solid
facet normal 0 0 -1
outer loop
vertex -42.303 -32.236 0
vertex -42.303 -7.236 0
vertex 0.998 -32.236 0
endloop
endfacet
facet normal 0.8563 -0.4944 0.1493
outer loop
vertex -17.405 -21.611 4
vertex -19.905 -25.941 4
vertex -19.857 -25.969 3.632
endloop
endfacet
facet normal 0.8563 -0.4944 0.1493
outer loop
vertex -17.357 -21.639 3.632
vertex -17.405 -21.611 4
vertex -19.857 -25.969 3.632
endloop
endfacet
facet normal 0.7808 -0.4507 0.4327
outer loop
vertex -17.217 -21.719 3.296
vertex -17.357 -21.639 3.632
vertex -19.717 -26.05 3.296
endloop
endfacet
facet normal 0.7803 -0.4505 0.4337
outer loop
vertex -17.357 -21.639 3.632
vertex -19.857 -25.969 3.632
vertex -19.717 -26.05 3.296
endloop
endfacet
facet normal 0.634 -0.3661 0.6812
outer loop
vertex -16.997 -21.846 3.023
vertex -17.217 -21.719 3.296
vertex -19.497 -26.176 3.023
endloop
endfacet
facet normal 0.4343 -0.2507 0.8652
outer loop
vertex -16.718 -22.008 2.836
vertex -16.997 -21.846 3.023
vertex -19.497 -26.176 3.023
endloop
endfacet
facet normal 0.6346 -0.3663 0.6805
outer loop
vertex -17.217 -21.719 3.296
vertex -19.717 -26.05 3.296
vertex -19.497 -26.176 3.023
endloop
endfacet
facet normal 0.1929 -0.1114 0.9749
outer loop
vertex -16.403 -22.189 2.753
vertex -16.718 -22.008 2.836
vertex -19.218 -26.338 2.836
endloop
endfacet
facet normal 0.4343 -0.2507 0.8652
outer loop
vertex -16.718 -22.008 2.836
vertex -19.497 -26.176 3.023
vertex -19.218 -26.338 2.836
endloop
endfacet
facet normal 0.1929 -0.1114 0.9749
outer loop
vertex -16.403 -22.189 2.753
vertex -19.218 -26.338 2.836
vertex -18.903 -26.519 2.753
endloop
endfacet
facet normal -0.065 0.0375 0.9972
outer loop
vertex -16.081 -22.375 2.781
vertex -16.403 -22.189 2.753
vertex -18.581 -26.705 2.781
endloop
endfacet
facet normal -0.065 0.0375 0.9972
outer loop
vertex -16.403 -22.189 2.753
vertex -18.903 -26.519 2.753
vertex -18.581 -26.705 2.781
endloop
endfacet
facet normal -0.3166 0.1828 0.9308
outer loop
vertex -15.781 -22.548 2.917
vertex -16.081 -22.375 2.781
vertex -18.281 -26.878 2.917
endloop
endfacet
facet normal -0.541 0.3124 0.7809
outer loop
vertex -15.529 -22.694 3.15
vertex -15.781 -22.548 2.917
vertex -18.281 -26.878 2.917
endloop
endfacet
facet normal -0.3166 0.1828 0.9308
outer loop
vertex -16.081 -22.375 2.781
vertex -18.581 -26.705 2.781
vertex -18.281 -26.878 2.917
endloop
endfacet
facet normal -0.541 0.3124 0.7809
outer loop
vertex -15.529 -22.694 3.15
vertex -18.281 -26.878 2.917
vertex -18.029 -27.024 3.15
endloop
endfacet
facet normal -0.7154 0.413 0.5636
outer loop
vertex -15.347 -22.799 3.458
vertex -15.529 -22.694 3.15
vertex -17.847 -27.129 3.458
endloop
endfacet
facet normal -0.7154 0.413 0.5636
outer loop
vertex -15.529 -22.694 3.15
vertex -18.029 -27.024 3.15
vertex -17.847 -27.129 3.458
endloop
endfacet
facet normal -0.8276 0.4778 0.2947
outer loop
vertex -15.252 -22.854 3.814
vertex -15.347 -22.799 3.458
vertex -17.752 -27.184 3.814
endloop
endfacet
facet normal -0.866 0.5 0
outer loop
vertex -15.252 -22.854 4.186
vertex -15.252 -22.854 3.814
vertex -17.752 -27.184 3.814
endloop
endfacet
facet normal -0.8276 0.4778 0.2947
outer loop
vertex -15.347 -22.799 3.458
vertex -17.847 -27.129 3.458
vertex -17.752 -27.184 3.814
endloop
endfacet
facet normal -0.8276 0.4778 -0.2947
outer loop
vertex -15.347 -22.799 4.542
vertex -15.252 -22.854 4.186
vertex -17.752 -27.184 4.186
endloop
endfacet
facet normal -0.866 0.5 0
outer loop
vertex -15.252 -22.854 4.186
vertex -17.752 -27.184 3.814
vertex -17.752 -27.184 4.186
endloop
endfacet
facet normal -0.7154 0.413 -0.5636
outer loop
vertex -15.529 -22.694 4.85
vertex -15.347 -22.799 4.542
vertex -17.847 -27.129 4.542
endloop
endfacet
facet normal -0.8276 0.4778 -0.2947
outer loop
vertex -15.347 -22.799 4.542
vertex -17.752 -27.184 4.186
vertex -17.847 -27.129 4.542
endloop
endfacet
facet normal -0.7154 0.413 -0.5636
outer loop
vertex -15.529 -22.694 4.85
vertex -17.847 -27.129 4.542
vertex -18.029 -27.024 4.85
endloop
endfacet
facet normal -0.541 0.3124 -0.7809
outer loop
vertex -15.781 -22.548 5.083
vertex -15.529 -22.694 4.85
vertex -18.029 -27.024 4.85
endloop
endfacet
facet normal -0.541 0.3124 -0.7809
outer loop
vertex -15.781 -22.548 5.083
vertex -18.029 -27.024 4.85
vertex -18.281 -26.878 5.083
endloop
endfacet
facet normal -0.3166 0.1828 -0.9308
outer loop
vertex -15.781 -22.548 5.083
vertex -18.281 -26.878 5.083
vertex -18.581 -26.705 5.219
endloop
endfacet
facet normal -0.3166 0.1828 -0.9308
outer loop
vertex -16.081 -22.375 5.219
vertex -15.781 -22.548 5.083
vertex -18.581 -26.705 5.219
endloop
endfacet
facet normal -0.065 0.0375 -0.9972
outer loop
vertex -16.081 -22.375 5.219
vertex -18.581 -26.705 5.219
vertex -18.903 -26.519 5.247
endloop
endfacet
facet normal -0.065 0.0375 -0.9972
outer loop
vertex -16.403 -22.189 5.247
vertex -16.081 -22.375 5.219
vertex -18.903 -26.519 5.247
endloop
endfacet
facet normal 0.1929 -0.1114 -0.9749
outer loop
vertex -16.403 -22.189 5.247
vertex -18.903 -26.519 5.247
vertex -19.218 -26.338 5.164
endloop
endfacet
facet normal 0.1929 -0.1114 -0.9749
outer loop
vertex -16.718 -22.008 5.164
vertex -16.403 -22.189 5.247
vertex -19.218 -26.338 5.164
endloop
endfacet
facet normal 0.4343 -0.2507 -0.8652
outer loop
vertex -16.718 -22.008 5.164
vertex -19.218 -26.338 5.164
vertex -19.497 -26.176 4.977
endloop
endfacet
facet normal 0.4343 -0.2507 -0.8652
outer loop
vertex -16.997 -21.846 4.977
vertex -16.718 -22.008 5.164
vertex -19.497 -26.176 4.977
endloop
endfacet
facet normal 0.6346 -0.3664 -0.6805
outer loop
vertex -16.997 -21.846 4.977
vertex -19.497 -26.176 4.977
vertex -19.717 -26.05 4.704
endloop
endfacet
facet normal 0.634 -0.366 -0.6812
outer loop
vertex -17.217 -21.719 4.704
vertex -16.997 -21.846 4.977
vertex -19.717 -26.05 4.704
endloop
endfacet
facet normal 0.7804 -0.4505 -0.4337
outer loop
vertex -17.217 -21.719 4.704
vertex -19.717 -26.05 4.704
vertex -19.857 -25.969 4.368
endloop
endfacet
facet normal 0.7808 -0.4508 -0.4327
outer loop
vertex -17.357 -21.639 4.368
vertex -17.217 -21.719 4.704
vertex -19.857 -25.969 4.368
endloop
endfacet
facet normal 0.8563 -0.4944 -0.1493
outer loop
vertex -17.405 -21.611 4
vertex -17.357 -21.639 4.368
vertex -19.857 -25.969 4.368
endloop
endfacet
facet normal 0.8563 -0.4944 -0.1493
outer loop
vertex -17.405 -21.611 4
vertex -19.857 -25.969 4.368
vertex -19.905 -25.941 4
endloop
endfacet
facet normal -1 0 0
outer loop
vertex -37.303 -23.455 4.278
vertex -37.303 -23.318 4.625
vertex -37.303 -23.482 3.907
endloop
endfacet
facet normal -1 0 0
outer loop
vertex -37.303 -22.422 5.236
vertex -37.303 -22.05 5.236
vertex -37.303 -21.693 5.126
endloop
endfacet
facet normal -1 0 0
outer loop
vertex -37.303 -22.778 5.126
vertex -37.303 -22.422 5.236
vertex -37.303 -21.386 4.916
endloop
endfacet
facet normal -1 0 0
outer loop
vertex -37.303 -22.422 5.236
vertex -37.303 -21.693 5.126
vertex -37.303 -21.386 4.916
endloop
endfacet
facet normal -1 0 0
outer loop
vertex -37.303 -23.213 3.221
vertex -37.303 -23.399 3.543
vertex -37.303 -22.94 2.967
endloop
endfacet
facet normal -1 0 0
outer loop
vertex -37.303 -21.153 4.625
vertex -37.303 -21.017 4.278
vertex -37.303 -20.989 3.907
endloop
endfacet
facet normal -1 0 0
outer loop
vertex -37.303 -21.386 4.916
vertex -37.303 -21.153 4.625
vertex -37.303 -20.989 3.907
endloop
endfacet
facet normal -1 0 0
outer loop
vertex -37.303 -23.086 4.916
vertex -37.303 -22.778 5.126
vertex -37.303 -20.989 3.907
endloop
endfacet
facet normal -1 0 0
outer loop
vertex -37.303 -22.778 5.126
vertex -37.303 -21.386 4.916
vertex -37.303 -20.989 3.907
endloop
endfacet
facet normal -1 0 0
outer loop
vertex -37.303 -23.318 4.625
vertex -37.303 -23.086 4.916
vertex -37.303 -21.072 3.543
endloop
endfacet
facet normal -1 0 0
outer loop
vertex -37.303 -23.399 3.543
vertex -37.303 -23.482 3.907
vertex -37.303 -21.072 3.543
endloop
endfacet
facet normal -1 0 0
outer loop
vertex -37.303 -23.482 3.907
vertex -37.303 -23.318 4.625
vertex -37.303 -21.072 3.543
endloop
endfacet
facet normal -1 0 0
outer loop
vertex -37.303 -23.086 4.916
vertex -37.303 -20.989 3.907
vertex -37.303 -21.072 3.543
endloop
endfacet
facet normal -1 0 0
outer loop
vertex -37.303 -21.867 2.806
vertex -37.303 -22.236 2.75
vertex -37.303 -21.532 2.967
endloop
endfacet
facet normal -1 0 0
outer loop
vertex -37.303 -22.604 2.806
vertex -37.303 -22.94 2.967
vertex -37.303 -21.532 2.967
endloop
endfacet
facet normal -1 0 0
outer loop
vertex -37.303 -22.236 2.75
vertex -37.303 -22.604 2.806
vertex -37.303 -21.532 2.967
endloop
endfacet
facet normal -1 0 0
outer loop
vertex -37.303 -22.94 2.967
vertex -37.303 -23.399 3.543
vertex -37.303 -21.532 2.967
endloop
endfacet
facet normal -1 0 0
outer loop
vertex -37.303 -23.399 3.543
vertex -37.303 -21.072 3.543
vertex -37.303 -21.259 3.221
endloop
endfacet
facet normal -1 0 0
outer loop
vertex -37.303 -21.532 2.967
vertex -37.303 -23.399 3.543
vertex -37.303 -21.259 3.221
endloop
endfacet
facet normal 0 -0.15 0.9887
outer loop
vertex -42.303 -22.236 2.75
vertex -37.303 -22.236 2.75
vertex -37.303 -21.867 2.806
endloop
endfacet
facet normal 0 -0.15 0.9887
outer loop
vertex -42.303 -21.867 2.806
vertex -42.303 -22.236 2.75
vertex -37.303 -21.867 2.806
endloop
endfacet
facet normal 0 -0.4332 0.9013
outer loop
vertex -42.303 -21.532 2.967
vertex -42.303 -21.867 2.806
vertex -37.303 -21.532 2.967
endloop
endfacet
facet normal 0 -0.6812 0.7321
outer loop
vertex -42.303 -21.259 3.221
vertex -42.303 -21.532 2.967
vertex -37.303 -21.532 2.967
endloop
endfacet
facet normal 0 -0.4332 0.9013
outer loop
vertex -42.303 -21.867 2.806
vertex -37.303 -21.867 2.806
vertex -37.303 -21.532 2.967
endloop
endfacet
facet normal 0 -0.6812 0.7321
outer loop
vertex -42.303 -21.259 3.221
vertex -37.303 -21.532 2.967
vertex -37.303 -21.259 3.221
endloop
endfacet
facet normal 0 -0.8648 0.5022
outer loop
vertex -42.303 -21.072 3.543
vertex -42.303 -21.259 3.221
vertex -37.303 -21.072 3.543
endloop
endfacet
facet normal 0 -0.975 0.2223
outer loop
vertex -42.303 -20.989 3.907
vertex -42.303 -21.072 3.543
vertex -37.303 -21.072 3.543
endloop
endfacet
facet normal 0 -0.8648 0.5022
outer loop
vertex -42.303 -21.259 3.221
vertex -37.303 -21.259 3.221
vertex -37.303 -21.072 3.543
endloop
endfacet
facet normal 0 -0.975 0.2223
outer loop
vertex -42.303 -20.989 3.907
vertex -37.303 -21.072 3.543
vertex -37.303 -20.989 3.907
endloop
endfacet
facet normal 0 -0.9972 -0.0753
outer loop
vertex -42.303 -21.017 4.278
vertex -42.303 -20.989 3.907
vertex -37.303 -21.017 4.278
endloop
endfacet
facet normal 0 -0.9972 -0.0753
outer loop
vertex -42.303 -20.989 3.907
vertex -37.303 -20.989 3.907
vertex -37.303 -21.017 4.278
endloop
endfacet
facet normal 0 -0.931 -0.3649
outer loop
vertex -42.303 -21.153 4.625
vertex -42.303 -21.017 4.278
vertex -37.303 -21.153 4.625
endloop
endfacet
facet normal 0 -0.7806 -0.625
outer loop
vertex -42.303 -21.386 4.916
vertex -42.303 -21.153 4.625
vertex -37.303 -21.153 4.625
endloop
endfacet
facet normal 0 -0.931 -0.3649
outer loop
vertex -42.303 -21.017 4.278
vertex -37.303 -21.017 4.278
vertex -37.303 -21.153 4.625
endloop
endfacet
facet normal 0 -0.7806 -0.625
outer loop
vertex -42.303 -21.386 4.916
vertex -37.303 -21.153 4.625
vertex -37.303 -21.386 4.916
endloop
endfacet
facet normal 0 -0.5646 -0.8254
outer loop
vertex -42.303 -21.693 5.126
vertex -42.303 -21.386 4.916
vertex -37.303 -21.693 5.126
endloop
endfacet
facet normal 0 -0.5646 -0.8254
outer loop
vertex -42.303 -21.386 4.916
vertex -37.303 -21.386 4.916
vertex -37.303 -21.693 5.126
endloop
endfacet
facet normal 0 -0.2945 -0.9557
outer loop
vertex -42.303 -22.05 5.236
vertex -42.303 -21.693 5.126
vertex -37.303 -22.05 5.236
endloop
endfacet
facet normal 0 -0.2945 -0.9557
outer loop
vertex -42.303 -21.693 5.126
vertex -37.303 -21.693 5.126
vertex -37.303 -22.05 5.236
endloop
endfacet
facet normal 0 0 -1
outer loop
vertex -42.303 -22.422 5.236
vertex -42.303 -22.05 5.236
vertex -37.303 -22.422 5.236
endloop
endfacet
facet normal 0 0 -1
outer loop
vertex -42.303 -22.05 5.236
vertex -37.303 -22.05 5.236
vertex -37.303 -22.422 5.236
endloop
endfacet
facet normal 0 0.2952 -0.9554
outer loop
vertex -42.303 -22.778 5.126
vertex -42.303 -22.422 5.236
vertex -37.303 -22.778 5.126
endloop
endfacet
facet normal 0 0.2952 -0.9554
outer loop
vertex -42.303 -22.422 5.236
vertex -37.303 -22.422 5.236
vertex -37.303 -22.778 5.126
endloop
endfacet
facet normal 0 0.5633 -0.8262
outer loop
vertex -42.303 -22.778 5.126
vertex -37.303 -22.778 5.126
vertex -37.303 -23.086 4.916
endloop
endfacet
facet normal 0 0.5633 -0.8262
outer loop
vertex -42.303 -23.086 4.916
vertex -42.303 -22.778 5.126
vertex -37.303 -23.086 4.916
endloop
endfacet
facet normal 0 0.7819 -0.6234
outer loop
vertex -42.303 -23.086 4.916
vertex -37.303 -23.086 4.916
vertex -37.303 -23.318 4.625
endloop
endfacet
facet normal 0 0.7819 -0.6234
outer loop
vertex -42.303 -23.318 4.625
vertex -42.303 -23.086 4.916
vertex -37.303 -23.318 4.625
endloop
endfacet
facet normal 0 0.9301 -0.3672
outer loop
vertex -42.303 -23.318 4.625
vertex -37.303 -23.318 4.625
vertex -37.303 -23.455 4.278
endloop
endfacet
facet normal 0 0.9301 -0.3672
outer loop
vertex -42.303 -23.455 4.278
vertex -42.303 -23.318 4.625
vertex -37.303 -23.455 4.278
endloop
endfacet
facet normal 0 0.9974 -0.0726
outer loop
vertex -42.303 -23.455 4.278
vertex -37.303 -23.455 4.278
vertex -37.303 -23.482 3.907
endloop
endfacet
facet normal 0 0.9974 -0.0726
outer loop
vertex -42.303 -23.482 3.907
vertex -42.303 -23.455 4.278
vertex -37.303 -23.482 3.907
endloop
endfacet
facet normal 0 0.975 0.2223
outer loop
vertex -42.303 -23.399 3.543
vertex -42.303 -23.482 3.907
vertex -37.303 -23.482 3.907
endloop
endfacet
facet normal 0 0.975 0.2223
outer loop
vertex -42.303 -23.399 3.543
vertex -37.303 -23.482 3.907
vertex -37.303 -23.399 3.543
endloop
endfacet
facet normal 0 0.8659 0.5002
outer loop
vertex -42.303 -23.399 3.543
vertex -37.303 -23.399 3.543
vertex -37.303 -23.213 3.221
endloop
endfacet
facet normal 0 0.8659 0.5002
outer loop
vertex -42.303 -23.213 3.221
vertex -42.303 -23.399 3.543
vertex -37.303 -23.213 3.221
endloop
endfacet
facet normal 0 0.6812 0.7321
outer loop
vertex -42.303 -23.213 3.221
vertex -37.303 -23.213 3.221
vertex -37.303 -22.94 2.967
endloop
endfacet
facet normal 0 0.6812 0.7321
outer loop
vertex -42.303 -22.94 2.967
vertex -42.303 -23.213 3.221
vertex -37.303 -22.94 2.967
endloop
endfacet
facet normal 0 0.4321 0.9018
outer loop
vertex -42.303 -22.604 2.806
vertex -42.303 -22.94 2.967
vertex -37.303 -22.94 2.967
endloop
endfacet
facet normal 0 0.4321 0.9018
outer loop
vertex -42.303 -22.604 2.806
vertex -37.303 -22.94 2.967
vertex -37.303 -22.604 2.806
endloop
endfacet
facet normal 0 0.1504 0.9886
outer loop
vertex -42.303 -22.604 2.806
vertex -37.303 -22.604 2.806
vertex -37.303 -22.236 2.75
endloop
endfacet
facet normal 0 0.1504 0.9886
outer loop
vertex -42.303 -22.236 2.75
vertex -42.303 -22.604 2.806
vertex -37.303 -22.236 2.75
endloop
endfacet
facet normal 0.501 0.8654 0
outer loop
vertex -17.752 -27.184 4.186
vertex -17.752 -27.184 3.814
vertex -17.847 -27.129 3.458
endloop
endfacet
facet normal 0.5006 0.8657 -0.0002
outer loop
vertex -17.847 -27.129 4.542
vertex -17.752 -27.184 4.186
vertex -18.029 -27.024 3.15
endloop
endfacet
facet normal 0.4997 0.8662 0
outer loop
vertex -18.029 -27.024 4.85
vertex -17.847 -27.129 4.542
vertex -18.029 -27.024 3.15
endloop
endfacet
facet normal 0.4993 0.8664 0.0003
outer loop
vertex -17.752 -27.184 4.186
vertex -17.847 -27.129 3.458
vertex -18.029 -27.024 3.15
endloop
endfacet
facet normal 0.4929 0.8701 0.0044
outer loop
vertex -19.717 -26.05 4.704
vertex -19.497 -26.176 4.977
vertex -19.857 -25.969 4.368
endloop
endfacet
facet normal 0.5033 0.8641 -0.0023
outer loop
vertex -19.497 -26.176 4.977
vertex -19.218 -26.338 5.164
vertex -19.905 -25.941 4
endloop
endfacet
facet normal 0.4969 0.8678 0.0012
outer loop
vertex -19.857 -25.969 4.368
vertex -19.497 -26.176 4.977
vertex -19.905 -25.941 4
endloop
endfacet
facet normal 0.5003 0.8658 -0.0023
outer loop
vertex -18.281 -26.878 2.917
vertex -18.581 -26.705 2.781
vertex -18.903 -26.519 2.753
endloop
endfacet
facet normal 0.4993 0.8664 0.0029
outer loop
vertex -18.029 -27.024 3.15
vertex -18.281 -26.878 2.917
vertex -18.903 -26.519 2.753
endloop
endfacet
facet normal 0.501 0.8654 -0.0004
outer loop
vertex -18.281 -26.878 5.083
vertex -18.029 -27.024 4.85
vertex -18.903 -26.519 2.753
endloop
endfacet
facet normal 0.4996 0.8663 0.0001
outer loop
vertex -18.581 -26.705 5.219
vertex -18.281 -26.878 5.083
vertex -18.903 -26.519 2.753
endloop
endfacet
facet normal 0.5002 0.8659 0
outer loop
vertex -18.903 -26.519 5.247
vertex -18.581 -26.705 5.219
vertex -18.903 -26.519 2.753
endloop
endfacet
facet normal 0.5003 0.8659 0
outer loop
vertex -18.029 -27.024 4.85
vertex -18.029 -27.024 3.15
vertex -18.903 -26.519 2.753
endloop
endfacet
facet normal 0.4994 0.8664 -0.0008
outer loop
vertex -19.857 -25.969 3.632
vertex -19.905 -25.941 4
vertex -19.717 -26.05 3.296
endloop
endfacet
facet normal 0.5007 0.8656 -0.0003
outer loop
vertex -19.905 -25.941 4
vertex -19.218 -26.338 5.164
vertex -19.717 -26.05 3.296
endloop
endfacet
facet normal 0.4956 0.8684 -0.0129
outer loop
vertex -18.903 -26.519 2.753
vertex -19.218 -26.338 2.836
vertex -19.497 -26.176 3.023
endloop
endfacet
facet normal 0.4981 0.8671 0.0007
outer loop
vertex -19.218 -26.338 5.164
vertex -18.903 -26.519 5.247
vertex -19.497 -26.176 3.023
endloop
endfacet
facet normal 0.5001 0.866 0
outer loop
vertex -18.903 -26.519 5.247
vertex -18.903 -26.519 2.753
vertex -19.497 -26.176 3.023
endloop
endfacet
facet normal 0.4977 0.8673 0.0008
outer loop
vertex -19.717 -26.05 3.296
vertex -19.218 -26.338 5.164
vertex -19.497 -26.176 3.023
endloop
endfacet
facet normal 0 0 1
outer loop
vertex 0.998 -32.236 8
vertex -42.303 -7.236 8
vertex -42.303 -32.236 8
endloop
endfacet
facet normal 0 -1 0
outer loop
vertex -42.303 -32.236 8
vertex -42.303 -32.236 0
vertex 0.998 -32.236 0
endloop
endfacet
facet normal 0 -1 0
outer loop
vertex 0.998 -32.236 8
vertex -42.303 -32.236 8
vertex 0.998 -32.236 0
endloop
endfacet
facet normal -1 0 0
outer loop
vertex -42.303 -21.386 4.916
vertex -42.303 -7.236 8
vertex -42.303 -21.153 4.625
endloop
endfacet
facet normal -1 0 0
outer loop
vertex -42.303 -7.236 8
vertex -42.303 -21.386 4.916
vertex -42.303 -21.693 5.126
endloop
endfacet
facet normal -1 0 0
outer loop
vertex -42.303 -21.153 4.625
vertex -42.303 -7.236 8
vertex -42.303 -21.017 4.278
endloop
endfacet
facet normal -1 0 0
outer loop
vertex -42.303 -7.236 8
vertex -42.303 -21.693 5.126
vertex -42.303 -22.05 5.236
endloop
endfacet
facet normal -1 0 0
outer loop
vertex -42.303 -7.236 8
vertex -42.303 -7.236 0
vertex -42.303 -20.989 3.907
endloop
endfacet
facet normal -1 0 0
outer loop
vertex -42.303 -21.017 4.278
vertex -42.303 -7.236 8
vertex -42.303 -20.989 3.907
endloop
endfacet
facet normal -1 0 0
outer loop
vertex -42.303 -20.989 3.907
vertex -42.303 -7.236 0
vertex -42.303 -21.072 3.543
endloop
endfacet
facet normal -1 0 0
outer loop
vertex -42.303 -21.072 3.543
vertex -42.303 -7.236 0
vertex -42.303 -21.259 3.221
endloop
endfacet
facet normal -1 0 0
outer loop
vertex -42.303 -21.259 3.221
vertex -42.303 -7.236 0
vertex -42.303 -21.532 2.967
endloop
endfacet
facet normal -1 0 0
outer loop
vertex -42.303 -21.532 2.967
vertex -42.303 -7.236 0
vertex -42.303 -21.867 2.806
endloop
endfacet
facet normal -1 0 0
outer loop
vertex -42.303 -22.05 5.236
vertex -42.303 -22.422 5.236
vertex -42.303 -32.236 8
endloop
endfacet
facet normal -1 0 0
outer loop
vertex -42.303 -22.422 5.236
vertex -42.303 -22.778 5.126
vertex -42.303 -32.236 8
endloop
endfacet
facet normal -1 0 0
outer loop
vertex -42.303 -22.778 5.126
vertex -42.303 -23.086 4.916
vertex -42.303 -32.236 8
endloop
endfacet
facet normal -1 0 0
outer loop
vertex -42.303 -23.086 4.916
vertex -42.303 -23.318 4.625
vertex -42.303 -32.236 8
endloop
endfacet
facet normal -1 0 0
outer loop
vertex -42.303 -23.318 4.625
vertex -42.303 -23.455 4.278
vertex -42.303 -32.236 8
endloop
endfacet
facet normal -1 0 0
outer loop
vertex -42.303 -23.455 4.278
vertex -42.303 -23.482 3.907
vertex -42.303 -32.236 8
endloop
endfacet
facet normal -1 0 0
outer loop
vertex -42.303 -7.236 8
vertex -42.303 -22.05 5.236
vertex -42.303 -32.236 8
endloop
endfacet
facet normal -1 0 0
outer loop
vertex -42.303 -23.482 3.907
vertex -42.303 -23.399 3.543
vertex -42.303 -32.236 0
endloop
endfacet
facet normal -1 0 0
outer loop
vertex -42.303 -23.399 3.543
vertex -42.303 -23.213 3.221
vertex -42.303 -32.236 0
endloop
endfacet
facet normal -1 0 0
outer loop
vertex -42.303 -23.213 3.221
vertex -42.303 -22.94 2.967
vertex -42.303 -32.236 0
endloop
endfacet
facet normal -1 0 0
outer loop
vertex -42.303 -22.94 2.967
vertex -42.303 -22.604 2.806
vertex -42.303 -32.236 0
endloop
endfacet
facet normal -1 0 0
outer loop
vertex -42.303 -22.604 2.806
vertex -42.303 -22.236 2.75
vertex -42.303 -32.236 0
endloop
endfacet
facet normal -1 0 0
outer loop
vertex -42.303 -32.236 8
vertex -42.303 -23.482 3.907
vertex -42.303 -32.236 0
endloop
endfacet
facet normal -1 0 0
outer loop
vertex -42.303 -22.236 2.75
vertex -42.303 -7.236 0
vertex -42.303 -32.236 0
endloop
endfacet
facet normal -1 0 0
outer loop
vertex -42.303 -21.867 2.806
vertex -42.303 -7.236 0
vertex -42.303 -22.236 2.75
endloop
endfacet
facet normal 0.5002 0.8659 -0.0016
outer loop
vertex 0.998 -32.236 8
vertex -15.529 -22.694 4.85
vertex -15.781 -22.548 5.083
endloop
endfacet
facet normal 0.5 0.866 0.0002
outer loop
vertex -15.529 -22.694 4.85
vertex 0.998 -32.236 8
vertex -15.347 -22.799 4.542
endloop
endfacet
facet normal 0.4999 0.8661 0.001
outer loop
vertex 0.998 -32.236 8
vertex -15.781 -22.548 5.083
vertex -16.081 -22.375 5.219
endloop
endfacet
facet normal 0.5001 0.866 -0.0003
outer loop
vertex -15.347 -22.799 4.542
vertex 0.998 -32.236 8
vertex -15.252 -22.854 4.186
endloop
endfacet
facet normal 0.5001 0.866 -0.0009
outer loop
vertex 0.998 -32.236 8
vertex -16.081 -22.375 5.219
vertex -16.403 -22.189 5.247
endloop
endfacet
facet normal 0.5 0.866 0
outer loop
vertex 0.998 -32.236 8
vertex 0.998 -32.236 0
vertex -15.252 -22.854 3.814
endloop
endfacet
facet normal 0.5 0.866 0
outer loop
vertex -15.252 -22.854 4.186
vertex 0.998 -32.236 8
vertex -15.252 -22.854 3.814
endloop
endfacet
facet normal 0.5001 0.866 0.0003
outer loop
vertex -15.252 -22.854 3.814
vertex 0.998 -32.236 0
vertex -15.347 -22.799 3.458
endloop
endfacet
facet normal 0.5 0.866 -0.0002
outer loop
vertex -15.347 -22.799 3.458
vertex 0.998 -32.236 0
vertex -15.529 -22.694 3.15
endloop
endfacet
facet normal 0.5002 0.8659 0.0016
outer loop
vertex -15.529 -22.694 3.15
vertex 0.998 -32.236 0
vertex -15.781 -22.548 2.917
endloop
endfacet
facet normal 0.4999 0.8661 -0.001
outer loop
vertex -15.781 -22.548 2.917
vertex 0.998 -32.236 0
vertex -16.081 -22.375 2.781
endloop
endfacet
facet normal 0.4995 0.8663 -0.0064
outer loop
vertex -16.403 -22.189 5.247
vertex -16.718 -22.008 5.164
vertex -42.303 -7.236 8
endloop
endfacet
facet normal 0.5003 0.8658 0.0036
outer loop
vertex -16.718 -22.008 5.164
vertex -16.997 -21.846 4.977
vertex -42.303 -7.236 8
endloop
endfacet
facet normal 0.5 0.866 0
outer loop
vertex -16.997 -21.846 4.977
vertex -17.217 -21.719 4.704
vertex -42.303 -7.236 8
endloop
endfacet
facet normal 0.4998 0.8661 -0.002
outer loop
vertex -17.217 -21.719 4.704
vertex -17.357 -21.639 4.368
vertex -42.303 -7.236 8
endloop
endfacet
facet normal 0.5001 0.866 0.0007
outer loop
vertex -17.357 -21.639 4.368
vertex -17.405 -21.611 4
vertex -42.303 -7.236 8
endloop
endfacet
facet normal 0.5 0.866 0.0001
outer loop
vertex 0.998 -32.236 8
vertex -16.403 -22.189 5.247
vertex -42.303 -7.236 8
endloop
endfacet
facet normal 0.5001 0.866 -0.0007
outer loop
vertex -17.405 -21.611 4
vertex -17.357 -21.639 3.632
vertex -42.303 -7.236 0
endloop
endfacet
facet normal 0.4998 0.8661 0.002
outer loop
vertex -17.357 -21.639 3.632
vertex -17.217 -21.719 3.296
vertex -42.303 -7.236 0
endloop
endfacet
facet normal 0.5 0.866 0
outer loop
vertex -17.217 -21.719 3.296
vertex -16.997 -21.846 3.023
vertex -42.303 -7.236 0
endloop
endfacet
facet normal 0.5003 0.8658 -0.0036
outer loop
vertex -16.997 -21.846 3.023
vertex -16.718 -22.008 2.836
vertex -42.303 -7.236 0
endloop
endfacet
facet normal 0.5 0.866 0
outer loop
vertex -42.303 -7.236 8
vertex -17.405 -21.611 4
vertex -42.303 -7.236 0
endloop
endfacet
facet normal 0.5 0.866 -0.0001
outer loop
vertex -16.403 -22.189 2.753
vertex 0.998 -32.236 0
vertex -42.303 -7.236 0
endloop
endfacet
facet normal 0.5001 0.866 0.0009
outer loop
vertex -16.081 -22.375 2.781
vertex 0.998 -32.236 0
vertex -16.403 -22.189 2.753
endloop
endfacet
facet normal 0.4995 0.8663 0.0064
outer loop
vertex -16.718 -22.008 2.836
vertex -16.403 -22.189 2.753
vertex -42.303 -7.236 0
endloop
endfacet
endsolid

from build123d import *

# Parameters (mm, degrees)
EXTRUDE_2_DEPTH        = 8
HOLE_WIZARD_M3_1_D     = 2.5
HOLE_WIZARD_M3_1_DEPTH = 5
HOLE_WIZARD_M3_2_D     = 2.5
HOLE_WIZARD_M3_2_DEPTH = 5


with BuildPart() as part:
    # 草图1 → 凸台-拉伸2 (new body)
    with BuildSketch(Plane.XY):
        Polygon((-42.3029947, -7.235847593), (-42.3029947, -32.235847593), (0.998275489, -32.235847593), align=None)
    extrude(amount=EXTRUDE_2_DEPTH)

    # M3 螺纹孔1
    with Locations(Plane.ZY.offset(42.3029947)):
        with Locations((4, -22.235847593)):
            Hole(HOLE_WIZARD_M3_1_D / 2, depth=HOLE_WIZARD_M3_1_DEPTH)

    # M3 螺纹孔2
    with Locations(Plane(origin=(-13.708962592, -23.744619728, 0), x_dir=(0.8660254037844363, -0.5000000000000042, 0), z_dir=(0.5000000000000042, 0.8660254037844363, 0))):
        with Locations((-3.01754427, -4)):
            Hole(HOLE_WIZARD_M3_2_D / 2, depth=HOLE_WIZARD_M3_2_DEPTH)


solid = part.part
